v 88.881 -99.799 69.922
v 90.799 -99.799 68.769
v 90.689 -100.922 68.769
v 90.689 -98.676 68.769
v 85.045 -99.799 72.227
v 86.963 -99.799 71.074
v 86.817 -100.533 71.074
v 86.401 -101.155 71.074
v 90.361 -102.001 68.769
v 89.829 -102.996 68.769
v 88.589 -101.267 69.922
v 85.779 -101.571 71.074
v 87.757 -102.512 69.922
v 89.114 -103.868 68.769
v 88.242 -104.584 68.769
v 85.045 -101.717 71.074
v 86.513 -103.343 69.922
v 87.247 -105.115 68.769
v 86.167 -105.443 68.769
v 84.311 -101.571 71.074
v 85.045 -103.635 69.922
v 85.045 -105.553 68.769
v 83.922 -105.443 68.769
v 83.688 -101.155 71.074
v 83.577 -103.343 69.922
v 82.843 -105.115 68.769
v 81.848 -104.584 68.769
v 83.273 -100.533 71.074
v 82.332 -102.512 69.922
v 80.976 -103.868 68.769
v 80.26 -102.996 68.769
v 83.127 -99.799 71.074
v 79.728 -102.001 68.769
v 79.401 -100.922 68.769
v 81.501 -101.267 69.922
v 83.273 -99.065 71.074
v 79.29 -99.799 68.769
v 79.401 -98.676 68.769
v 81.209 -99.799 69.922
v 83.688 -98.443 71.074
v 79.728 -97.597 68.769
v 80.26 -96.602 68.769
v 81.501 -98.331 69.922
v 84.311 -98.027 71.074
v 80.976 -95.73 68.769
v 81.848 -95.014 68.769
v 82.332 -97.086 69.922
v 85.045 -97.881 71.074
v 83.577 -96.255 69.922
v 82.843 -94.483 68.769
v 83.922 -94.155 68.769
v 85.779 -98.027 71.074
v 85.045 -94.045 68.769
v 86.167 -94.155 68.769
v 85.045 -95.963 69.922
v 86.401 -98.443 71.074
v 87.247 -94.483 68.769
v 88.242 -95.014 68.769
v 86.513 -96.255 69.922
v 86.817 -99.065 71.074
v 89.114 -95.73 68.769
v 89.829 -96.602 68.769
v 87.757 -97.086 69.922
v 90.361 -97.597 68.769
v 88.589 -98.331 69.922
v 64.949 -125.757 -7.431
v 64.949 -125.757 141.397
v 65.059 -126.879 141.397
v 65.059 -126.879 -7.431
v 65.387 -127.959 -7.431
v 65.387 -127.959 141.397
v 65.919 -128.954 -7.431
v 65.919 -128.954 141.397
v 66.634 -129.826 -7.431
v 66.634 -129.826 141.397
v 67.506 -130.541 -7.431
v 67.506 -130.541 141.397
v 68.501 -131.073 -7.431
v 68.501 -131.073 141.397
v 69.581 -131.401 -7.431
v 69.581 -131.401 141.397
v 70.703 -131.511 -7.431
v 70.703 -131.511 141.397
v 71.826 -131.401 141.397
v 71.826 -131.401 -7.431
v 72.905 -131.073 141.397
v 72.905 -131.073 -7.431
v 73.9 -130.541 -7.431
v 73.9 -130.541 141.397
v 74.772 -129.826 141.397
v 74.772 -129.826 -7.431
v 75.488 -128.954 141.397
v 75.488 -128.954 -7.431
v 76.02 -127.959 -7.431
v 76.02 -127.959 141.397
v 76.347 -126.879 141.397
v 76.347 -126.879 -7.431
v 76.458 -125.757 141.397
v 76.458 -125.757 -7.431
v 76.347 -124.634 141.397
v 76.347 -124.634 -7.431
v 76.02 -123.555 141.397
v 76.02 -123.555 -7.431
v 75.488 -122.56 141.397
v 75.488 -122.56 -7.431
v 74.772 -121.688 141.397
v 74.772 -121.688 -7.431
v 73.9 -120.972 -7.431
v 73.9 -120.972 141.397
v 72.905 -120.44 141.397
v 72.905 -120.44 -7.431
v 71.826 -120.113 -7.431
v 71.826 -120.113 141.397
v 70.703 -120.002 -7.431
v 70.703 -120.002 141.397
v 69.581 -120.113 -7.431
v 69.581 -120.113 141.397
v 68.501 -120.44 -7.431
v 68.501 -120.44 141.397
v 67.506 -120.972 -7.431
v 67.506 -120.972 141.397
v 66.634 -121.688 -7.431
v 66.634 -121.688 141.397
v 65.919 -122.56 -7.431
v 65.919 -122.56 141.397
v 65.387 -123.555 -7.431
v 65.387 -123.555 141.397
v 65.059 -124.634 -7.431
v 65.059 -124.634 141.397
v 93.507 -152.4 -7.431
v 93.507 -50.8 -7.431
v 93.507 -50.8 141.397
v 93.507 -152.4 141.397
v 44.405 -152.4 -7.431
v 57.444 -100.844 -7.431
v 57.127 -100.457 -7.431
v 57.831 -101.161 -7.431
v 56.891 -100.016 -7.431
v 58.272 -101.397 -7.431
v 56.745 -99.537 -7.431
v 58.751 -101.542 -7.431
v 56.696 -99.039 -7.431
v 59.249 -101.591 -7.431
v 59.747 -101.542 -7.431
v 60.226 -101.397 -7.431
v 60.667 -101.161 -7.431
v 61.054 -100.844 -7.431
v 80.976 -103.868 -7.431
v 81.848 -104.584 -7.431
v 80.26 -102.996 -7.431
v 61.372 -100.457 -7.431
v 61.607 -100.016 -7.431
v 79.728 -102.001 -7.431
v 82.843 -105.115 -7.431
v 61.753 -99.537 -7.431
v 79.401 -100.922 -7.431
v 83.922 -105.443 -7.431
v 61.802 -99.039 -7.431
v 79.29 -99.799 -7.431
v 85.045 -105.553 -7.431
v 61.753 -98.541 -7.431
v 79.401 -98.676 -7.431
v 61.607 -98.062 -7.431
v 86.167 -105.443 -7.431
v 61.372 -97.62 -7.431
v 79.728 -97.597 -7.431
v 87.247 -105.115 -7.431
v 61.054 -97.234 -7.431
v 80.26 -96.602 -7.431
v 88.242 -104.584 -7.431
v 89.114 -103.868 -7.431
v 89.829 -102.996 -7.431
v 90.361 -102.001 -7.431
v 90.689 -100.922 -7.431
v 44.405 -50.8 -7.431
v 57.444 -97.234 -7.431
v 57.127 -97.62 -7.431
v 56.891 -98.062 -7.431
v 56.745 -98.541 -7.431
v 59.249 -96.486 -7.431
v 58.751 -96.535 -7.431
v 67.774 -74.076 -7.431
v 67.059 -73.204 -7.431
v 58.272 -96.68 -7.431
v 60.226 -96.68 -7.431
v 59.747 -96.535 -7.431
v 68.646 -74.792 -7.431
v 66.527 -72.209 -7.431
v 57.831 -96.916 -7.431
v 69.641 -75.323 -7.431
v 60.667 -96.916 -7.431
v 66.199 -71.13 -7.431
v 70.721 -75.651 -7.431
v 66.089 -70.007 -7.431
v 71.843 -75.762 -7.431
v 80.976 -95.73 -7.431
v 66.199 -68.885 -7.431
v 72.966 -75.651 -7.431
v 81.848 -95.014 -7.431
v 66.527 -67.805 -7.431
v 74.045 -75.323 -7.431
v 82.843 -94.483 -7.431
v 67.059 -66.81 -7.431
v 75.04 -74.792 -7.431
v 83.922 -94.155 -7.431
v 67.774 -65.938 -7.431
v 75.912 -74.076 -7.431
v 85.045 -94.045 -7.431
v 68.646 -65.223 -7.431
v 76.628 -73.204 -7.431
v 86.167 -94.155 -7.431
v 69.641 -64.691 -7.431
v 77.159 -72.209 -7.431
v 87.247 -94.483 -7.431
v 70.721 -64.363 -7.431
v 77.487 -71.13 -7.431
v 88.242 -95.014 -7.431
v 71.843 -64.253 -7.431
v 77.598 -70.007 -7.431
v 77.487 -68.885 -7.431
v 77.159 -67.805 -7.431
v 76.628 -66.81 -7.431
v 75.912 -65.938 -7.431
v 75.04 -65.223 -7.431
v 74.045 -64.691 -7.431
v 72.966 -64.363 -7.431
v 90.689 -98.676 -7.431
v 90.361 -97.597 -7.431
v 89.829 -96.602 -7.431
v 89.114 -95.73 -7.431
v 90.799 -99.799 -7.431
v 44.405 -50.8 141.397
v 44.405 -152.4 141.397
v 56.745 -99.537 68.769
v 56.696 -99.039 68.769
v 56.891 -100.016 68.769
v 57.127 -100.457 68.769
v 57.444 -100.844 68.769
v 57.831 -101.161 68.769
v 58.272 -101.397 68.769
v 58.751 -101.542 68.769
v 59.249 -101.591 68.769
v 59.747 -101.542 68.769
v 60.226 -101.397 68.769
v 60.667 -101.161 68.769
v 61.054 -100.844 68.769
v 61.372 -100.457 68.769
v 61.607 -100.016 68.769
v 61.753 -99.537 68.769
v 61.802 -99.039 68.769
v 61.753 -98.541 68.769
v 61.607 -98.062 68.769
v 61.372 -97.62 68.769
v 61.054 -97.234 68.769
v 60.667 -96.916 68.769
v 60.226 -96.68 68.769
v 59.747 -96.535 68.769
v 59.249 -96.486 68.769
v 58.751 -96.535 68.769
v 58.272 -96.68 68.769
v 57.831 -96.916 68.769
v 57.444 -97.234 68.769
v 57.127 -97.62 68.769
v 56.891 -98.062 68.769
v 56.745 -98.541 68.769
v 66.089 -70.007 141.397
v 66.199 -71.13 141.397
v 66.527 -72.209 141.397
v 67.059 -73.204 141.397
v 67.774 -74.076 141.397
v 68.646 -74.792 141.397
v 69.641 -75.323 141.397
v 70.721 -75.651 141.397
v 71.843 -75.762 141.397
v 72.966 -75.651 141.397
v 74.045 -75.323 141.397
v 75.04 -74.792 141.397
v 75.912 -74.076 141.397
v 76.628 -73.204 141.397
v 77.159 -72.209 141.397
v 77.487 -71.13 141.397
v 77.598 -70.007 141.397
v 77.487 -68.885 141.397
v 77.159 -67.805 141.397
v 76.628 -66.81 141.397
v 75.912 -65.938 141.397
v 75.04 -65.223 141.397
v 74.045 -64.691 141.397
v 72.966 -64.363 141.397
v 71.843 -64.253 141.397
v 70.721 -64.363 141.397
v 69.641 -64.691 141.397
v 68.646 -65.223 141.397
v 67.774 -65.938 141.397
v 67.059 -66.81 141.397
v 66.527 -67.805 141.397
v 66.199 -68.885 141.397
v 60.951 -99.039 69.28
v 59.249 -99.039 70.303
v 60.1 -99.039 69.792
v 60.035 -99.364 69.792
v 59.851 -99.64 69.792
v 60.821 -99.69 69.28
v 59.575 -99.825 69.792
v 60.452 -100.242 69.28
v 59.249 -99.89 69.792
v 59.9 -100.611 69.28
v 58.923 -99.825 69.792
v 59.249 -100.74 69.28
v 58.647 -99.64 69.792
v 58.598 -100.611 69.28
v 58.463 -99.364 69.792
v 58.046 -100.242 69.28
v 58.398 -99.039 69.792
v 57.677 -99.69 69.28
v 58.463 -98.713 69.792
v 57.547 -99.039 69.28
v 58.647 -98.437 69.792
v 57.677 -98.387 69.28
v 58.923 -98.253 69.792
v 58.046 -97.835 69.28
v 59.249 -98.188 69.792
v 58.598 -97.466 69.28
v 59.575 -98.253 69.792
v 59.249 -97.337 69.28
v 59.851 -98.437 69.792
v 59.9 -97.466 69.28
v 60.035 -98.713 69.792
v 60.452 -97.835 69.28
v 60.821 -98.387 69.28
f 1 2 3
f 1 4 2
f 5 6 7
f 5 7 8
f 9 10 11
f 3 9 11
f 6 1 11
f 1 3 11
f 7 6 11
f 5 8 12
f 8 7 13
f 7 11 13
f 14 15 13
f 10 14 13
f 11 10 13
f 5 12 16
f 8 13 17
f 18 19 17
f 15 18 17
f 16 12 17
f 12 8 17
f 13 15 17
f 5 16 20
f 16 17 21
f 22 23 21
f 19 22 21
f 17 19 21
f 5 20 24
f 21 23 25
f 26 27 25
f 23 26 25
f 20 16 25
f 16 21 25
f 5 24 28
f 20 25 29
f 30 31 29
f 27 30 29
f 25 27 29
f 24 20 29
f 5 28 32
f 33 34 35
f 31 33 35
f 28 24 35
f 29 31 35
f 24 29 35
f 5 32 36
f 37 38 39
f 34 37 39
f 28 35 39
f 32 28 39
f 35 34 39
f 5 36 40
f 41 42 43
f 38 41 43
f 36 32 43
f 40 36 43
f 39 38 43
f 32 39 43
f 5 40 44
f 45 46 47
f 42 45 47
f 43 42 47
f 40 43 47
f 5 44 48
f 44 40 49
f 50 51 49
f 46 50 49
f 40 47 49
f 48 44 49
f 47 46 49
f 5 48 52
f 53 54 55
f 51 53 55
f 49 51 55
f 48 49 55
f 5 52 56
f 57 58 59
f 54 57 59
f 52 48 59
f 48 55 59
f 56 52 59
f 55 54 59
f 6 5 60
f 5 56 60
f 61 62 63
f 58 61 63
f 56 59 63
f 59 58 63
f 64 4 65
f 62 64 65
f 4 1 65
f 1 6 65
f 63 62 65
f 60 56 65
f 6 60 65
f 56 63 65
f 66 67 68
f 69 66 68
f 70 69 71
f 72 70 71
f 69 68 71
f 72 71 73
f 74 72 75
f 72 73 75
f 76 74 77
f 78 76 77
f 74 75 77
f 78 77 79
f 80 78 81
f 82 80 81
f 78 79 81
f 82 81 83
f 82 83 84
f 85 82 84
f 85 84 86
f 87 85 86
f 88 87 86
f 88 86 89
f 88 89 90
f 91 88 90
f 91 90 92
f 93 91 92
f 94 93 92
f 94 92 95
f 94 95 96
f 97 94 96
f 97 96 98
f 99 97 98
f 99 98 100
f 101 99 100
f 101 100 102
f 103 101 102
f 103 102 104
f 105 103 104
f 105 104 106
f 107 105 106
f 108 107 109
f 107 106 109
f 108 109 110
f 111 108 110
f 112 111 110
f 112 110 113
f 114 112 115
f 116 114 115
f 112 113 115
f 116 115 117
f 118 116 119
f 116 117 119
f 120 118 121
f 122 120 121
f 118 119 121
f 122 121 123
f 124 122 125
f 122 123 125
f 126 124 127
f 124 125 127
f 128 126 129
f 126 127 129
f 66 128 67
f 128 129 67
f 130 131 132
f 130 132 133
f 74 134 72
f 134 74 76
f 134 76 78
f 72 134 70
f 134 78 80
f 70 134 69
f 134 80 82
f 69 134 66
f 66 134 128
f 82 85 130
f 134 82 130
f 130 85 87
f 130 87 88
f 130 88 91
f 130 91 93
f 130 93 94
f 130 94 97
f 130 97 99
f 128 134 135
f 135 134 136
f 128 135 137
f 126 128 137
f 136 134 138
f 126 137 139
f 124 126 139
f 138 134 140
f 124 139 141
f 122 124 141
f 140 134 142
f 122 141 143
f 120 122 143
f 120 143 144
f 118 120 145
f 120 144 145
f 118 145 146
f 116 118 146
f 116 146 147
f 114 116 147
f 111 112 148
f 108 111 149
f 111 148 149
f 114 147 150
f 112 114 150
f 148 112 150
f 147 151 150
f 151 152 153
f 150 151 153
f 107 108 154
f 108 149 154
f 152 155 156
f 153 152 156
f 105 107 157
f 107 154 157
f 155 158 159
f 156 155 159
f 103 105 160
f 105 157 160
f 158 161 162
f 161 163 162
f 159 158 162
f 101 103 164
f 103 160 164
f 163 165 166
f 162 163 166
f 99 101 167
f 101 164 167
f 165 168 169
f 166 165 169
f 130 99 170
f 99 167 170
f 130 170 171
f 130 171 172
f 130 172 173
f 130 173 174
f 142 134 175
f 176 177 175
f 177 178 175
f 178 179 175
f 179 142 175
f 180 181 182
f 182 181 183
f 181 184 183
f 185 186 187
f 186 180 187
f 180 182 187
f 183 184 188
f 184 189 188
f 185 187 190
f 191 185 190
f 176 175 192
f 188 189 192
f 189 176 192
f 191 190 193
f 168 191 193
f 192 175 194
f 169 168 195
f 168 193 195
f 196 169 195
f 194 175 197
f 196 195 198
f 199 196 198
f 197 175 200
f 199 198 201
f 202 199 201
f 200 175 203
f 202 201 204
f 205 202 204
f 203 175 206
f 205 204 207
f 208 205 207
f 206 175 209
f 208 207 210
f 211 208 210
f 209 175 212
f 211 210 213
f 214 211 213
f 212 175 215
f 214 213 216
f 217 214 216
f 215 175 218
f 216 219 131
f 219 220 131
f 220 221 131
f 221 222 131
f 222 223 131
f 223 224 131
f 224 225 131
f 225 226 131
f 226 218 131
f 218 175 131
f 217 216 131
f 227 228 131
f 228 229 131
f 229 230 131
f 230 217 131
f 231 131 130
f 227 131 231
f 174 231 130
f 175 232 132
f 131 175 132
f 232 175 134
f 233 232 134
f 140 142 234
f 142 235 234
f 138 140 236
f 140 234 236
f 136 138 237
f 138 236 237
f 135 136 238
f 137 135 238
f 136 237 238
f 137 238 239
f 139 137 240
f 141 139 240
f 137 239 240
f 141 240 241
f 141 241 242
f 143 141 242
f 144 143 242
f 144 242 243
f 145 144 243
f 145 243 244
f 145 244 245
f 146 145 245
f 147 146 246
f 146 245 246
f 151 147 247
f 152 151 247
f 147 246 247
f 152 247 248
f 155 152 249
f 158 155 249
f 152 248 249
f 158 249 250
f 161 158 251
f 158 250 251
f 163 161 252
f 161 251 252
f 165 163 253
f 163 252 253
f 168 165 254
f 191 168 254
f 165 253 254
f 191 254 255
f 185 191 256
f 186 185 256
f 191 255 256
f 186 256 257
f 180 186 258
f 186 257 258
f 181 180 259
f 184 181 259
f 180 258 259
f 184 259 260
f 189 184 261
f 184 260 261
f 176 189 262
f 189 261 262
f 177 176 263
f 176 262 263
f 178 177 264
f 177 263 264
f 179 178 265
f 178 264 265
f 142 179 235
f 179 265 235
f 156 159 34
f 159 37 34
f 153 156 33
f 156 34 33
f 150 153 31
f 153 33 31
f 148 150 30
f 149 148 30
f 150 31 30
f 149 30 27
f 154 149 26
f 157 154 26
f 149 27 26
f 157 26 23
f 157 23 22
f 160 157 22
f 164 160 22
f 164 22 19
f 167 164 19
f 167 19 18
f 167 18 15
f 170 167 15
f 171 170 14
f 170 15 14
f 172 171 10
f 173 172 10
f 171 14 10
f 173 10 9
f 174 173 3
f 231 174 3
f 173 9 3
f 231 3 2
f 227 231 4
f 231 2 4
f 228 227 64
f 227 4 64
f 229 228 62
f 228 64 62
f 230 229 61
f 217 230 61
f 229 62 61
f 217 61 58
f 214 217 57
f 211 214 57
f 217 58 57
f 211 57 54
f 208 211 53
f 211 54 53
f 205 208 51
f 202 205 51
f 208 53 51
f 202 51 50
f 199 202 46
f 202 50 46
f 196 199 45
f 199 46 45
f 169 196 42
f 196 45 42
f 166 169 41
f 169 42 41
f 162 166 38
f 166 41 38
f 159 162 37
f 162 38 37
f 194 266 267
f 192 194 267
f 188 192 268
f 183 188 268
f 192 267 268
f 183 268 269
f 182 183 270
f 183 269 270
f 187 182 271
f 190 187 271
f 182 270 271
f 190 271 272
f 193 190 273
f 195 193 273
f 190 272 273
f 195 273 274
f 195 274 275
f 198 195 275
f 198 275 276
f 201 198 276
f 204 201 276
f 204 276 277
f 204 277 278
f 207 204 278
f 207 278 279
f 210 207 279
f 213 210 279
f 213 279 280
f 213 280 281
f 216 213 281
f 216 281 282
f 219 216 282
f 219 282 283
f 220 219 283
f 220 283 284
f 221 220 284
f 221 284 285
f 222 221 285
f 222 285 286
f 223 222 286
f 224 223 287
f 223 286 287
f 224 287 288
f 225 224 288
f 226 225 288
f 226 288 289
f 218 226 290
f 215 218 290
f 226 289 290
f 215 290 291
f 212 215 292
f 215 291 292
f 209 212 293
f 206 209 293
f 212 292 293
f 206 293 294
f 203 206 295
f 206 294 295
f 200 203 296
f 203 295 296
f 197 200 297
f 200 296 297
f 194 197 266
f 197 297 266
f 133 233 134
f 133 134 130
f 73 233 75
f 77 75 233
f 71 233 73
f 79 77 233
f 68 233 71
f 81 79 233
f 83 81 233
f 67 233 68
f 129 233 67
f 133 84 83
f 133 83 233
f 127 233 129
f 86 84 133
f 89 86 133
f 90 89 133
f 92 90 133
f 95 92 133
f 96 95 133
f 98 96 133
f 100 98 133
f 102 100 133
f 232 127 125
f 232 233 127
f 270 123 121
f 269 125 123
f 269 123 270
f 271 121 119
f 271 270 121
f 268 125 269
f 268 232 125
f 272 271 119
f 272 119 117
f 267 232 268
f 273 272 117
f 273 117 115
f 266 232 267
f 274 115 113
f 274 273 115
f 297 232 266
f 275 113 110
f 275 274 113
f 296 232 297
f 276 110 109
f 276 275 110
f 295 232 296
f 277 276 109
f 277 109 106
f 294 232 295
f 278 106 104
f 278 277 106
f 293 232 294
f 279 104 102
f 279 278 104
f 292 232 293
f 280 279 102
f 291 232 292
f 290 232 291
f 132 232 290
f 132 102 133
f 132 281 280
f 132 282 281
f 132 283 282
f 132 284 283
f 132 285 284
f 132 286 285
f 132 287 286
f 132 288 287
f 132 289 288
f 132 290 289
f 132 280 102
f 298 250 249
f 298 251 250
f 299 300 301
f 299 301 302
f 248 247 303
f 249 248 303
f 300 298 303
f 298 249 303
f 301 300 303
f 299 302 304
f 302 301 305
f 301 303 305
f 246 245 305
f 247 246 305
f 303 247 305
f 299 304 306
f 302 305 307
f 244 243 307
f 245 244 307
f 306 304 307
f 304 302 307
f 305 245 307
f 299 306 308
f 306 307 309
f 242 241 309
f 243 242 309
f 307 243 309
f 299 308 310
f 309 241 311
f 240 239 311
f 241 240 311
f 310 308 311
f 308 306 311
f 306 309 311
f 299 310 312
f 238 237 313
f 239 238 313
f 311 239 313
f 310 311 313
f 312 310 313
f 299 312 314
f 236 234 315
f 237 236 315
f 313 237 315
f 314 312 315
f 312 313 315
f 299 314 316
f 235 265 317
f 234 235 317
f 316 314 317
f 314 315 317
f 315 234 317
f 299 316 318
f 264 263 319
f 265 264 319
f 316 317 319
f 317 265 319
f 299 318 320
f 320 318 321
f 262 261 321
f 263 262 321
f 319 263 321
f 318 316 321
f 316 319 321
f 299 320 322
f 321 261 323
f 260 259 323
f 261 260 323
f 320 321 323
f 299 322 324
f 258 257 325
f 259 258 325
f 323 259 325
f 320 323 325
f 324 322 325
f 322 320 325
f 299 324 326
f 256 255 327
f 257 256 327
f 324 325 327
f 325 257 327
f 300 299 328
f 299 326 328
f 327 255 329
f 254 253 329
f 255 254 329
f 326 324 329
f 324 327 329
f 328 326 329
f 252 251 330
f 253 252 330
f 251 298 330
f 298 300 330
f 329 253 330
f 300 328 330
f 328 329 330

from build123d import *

# Parameters (mm, degrees)
F0_W      = 99.9017828144
F0_H      = 47.2273882478
F1_DEPTH  = 152.4
F2_DEPTH  = 50.8
F3_DEPTH  = 50.8
F4_DEPTH  = 50.8
F5_DEPTH  = 50.8
F7_D      = 11.50874
F10_D     = 11.50874
F10_DEPTH = 76.2
F10_TIP   = 3.4575743203
F11_D     = 5.1054
F11_DEPTH = 76.2
F11_TIP   = 1.5338169022


with BuildPart() as f1:
    # F0 (on Front) → F1 (new body)
    with BuildSketch(Plane.XZ):
        with Locations((43.5557949822, 16.1829041317)):
            Rectangle(F0_W, F0_H)
    extrude(amount=F1_DEPTH)

    # F2 (add): a face of the model
    f2_faces = [f1.faces().sort_by_distance(p)[0] for p in [
        (43.5557949822, -76.2, 39.7965982556),
    ]]
    extrude(f2_faces, amount=F2_DEPTH)

    # F3 (add): a face of the model
    f3_faces = [f1.faces().sort_by_distance(p)[0] for p in [
        (43.5557949822, -76.2, 90.5965982556),
    ]]
    extrude(f3_faces, amount=F3_DEPTH)

    # F4 (cut): a face of the model
    f4_faces = [f1.faces().sort_by_distance(p)[0] for p in [
        (-6.395096425, -76.2, 66.9829041317),
    ]]
    extrude(f4_faces, amount=-F4_DEPTH, mode=Mode.SUBTRACT)

    # F5 (cut): a face of the model
    f5_faces = [f1.faces().sort_by_distance(p)[0] for p in [
        (68.9557949822, 0, 66.9829041317),
    ]]
    extrude(f5_faces, amount=-F5_DEPTH, mode=Mode.SUBTRACT)

    # F7 (through all)
    with Locations(Plane(origin=(0, 0, -7.4307899922), x_dir=(1, 0, 0), z_dir=(0, 0, -1))):
        with Locations((70.703163743, 125.7567703724), (71.8431398273, 70.0071305037)):
            Hole(F7_D / 2)

    # F10
    with Locations(Plane(origin=(0, 0, -7.4307899922), x_dir=(1, 0, 0), z_dir=(0, 0, -1))):
        with Locations((85.044786334, 99.7990220785)):
            Hole(F10_D / 2, depth=F10_DEPTH)
            with Locations((0, 0, -(F10_DEPTH + F10_TIP / 2))):  # 118° drill point
                Cone(0, F10_D / 2, F10_TIP, mode=Mode.SUBTRACT)

    # F11
    with Locations(Plane(origin=(0, 0, -7.4307899922), x_dir=(1, 0, 0), z_dir=(0, 0, -1))):
        with Locations((59.2490546405, 99.0386679769)):
            Hole(F11_D / 2, depth=F11_DEPTH)
            with Locations((0, 0, -(F11_DEPTH + F11_TIP / 2))):  # 118° drill point
                Cone(0, F11_D / 2, F11_TIP, mode=Mode.SUBTRACT)


solid = f1.part
